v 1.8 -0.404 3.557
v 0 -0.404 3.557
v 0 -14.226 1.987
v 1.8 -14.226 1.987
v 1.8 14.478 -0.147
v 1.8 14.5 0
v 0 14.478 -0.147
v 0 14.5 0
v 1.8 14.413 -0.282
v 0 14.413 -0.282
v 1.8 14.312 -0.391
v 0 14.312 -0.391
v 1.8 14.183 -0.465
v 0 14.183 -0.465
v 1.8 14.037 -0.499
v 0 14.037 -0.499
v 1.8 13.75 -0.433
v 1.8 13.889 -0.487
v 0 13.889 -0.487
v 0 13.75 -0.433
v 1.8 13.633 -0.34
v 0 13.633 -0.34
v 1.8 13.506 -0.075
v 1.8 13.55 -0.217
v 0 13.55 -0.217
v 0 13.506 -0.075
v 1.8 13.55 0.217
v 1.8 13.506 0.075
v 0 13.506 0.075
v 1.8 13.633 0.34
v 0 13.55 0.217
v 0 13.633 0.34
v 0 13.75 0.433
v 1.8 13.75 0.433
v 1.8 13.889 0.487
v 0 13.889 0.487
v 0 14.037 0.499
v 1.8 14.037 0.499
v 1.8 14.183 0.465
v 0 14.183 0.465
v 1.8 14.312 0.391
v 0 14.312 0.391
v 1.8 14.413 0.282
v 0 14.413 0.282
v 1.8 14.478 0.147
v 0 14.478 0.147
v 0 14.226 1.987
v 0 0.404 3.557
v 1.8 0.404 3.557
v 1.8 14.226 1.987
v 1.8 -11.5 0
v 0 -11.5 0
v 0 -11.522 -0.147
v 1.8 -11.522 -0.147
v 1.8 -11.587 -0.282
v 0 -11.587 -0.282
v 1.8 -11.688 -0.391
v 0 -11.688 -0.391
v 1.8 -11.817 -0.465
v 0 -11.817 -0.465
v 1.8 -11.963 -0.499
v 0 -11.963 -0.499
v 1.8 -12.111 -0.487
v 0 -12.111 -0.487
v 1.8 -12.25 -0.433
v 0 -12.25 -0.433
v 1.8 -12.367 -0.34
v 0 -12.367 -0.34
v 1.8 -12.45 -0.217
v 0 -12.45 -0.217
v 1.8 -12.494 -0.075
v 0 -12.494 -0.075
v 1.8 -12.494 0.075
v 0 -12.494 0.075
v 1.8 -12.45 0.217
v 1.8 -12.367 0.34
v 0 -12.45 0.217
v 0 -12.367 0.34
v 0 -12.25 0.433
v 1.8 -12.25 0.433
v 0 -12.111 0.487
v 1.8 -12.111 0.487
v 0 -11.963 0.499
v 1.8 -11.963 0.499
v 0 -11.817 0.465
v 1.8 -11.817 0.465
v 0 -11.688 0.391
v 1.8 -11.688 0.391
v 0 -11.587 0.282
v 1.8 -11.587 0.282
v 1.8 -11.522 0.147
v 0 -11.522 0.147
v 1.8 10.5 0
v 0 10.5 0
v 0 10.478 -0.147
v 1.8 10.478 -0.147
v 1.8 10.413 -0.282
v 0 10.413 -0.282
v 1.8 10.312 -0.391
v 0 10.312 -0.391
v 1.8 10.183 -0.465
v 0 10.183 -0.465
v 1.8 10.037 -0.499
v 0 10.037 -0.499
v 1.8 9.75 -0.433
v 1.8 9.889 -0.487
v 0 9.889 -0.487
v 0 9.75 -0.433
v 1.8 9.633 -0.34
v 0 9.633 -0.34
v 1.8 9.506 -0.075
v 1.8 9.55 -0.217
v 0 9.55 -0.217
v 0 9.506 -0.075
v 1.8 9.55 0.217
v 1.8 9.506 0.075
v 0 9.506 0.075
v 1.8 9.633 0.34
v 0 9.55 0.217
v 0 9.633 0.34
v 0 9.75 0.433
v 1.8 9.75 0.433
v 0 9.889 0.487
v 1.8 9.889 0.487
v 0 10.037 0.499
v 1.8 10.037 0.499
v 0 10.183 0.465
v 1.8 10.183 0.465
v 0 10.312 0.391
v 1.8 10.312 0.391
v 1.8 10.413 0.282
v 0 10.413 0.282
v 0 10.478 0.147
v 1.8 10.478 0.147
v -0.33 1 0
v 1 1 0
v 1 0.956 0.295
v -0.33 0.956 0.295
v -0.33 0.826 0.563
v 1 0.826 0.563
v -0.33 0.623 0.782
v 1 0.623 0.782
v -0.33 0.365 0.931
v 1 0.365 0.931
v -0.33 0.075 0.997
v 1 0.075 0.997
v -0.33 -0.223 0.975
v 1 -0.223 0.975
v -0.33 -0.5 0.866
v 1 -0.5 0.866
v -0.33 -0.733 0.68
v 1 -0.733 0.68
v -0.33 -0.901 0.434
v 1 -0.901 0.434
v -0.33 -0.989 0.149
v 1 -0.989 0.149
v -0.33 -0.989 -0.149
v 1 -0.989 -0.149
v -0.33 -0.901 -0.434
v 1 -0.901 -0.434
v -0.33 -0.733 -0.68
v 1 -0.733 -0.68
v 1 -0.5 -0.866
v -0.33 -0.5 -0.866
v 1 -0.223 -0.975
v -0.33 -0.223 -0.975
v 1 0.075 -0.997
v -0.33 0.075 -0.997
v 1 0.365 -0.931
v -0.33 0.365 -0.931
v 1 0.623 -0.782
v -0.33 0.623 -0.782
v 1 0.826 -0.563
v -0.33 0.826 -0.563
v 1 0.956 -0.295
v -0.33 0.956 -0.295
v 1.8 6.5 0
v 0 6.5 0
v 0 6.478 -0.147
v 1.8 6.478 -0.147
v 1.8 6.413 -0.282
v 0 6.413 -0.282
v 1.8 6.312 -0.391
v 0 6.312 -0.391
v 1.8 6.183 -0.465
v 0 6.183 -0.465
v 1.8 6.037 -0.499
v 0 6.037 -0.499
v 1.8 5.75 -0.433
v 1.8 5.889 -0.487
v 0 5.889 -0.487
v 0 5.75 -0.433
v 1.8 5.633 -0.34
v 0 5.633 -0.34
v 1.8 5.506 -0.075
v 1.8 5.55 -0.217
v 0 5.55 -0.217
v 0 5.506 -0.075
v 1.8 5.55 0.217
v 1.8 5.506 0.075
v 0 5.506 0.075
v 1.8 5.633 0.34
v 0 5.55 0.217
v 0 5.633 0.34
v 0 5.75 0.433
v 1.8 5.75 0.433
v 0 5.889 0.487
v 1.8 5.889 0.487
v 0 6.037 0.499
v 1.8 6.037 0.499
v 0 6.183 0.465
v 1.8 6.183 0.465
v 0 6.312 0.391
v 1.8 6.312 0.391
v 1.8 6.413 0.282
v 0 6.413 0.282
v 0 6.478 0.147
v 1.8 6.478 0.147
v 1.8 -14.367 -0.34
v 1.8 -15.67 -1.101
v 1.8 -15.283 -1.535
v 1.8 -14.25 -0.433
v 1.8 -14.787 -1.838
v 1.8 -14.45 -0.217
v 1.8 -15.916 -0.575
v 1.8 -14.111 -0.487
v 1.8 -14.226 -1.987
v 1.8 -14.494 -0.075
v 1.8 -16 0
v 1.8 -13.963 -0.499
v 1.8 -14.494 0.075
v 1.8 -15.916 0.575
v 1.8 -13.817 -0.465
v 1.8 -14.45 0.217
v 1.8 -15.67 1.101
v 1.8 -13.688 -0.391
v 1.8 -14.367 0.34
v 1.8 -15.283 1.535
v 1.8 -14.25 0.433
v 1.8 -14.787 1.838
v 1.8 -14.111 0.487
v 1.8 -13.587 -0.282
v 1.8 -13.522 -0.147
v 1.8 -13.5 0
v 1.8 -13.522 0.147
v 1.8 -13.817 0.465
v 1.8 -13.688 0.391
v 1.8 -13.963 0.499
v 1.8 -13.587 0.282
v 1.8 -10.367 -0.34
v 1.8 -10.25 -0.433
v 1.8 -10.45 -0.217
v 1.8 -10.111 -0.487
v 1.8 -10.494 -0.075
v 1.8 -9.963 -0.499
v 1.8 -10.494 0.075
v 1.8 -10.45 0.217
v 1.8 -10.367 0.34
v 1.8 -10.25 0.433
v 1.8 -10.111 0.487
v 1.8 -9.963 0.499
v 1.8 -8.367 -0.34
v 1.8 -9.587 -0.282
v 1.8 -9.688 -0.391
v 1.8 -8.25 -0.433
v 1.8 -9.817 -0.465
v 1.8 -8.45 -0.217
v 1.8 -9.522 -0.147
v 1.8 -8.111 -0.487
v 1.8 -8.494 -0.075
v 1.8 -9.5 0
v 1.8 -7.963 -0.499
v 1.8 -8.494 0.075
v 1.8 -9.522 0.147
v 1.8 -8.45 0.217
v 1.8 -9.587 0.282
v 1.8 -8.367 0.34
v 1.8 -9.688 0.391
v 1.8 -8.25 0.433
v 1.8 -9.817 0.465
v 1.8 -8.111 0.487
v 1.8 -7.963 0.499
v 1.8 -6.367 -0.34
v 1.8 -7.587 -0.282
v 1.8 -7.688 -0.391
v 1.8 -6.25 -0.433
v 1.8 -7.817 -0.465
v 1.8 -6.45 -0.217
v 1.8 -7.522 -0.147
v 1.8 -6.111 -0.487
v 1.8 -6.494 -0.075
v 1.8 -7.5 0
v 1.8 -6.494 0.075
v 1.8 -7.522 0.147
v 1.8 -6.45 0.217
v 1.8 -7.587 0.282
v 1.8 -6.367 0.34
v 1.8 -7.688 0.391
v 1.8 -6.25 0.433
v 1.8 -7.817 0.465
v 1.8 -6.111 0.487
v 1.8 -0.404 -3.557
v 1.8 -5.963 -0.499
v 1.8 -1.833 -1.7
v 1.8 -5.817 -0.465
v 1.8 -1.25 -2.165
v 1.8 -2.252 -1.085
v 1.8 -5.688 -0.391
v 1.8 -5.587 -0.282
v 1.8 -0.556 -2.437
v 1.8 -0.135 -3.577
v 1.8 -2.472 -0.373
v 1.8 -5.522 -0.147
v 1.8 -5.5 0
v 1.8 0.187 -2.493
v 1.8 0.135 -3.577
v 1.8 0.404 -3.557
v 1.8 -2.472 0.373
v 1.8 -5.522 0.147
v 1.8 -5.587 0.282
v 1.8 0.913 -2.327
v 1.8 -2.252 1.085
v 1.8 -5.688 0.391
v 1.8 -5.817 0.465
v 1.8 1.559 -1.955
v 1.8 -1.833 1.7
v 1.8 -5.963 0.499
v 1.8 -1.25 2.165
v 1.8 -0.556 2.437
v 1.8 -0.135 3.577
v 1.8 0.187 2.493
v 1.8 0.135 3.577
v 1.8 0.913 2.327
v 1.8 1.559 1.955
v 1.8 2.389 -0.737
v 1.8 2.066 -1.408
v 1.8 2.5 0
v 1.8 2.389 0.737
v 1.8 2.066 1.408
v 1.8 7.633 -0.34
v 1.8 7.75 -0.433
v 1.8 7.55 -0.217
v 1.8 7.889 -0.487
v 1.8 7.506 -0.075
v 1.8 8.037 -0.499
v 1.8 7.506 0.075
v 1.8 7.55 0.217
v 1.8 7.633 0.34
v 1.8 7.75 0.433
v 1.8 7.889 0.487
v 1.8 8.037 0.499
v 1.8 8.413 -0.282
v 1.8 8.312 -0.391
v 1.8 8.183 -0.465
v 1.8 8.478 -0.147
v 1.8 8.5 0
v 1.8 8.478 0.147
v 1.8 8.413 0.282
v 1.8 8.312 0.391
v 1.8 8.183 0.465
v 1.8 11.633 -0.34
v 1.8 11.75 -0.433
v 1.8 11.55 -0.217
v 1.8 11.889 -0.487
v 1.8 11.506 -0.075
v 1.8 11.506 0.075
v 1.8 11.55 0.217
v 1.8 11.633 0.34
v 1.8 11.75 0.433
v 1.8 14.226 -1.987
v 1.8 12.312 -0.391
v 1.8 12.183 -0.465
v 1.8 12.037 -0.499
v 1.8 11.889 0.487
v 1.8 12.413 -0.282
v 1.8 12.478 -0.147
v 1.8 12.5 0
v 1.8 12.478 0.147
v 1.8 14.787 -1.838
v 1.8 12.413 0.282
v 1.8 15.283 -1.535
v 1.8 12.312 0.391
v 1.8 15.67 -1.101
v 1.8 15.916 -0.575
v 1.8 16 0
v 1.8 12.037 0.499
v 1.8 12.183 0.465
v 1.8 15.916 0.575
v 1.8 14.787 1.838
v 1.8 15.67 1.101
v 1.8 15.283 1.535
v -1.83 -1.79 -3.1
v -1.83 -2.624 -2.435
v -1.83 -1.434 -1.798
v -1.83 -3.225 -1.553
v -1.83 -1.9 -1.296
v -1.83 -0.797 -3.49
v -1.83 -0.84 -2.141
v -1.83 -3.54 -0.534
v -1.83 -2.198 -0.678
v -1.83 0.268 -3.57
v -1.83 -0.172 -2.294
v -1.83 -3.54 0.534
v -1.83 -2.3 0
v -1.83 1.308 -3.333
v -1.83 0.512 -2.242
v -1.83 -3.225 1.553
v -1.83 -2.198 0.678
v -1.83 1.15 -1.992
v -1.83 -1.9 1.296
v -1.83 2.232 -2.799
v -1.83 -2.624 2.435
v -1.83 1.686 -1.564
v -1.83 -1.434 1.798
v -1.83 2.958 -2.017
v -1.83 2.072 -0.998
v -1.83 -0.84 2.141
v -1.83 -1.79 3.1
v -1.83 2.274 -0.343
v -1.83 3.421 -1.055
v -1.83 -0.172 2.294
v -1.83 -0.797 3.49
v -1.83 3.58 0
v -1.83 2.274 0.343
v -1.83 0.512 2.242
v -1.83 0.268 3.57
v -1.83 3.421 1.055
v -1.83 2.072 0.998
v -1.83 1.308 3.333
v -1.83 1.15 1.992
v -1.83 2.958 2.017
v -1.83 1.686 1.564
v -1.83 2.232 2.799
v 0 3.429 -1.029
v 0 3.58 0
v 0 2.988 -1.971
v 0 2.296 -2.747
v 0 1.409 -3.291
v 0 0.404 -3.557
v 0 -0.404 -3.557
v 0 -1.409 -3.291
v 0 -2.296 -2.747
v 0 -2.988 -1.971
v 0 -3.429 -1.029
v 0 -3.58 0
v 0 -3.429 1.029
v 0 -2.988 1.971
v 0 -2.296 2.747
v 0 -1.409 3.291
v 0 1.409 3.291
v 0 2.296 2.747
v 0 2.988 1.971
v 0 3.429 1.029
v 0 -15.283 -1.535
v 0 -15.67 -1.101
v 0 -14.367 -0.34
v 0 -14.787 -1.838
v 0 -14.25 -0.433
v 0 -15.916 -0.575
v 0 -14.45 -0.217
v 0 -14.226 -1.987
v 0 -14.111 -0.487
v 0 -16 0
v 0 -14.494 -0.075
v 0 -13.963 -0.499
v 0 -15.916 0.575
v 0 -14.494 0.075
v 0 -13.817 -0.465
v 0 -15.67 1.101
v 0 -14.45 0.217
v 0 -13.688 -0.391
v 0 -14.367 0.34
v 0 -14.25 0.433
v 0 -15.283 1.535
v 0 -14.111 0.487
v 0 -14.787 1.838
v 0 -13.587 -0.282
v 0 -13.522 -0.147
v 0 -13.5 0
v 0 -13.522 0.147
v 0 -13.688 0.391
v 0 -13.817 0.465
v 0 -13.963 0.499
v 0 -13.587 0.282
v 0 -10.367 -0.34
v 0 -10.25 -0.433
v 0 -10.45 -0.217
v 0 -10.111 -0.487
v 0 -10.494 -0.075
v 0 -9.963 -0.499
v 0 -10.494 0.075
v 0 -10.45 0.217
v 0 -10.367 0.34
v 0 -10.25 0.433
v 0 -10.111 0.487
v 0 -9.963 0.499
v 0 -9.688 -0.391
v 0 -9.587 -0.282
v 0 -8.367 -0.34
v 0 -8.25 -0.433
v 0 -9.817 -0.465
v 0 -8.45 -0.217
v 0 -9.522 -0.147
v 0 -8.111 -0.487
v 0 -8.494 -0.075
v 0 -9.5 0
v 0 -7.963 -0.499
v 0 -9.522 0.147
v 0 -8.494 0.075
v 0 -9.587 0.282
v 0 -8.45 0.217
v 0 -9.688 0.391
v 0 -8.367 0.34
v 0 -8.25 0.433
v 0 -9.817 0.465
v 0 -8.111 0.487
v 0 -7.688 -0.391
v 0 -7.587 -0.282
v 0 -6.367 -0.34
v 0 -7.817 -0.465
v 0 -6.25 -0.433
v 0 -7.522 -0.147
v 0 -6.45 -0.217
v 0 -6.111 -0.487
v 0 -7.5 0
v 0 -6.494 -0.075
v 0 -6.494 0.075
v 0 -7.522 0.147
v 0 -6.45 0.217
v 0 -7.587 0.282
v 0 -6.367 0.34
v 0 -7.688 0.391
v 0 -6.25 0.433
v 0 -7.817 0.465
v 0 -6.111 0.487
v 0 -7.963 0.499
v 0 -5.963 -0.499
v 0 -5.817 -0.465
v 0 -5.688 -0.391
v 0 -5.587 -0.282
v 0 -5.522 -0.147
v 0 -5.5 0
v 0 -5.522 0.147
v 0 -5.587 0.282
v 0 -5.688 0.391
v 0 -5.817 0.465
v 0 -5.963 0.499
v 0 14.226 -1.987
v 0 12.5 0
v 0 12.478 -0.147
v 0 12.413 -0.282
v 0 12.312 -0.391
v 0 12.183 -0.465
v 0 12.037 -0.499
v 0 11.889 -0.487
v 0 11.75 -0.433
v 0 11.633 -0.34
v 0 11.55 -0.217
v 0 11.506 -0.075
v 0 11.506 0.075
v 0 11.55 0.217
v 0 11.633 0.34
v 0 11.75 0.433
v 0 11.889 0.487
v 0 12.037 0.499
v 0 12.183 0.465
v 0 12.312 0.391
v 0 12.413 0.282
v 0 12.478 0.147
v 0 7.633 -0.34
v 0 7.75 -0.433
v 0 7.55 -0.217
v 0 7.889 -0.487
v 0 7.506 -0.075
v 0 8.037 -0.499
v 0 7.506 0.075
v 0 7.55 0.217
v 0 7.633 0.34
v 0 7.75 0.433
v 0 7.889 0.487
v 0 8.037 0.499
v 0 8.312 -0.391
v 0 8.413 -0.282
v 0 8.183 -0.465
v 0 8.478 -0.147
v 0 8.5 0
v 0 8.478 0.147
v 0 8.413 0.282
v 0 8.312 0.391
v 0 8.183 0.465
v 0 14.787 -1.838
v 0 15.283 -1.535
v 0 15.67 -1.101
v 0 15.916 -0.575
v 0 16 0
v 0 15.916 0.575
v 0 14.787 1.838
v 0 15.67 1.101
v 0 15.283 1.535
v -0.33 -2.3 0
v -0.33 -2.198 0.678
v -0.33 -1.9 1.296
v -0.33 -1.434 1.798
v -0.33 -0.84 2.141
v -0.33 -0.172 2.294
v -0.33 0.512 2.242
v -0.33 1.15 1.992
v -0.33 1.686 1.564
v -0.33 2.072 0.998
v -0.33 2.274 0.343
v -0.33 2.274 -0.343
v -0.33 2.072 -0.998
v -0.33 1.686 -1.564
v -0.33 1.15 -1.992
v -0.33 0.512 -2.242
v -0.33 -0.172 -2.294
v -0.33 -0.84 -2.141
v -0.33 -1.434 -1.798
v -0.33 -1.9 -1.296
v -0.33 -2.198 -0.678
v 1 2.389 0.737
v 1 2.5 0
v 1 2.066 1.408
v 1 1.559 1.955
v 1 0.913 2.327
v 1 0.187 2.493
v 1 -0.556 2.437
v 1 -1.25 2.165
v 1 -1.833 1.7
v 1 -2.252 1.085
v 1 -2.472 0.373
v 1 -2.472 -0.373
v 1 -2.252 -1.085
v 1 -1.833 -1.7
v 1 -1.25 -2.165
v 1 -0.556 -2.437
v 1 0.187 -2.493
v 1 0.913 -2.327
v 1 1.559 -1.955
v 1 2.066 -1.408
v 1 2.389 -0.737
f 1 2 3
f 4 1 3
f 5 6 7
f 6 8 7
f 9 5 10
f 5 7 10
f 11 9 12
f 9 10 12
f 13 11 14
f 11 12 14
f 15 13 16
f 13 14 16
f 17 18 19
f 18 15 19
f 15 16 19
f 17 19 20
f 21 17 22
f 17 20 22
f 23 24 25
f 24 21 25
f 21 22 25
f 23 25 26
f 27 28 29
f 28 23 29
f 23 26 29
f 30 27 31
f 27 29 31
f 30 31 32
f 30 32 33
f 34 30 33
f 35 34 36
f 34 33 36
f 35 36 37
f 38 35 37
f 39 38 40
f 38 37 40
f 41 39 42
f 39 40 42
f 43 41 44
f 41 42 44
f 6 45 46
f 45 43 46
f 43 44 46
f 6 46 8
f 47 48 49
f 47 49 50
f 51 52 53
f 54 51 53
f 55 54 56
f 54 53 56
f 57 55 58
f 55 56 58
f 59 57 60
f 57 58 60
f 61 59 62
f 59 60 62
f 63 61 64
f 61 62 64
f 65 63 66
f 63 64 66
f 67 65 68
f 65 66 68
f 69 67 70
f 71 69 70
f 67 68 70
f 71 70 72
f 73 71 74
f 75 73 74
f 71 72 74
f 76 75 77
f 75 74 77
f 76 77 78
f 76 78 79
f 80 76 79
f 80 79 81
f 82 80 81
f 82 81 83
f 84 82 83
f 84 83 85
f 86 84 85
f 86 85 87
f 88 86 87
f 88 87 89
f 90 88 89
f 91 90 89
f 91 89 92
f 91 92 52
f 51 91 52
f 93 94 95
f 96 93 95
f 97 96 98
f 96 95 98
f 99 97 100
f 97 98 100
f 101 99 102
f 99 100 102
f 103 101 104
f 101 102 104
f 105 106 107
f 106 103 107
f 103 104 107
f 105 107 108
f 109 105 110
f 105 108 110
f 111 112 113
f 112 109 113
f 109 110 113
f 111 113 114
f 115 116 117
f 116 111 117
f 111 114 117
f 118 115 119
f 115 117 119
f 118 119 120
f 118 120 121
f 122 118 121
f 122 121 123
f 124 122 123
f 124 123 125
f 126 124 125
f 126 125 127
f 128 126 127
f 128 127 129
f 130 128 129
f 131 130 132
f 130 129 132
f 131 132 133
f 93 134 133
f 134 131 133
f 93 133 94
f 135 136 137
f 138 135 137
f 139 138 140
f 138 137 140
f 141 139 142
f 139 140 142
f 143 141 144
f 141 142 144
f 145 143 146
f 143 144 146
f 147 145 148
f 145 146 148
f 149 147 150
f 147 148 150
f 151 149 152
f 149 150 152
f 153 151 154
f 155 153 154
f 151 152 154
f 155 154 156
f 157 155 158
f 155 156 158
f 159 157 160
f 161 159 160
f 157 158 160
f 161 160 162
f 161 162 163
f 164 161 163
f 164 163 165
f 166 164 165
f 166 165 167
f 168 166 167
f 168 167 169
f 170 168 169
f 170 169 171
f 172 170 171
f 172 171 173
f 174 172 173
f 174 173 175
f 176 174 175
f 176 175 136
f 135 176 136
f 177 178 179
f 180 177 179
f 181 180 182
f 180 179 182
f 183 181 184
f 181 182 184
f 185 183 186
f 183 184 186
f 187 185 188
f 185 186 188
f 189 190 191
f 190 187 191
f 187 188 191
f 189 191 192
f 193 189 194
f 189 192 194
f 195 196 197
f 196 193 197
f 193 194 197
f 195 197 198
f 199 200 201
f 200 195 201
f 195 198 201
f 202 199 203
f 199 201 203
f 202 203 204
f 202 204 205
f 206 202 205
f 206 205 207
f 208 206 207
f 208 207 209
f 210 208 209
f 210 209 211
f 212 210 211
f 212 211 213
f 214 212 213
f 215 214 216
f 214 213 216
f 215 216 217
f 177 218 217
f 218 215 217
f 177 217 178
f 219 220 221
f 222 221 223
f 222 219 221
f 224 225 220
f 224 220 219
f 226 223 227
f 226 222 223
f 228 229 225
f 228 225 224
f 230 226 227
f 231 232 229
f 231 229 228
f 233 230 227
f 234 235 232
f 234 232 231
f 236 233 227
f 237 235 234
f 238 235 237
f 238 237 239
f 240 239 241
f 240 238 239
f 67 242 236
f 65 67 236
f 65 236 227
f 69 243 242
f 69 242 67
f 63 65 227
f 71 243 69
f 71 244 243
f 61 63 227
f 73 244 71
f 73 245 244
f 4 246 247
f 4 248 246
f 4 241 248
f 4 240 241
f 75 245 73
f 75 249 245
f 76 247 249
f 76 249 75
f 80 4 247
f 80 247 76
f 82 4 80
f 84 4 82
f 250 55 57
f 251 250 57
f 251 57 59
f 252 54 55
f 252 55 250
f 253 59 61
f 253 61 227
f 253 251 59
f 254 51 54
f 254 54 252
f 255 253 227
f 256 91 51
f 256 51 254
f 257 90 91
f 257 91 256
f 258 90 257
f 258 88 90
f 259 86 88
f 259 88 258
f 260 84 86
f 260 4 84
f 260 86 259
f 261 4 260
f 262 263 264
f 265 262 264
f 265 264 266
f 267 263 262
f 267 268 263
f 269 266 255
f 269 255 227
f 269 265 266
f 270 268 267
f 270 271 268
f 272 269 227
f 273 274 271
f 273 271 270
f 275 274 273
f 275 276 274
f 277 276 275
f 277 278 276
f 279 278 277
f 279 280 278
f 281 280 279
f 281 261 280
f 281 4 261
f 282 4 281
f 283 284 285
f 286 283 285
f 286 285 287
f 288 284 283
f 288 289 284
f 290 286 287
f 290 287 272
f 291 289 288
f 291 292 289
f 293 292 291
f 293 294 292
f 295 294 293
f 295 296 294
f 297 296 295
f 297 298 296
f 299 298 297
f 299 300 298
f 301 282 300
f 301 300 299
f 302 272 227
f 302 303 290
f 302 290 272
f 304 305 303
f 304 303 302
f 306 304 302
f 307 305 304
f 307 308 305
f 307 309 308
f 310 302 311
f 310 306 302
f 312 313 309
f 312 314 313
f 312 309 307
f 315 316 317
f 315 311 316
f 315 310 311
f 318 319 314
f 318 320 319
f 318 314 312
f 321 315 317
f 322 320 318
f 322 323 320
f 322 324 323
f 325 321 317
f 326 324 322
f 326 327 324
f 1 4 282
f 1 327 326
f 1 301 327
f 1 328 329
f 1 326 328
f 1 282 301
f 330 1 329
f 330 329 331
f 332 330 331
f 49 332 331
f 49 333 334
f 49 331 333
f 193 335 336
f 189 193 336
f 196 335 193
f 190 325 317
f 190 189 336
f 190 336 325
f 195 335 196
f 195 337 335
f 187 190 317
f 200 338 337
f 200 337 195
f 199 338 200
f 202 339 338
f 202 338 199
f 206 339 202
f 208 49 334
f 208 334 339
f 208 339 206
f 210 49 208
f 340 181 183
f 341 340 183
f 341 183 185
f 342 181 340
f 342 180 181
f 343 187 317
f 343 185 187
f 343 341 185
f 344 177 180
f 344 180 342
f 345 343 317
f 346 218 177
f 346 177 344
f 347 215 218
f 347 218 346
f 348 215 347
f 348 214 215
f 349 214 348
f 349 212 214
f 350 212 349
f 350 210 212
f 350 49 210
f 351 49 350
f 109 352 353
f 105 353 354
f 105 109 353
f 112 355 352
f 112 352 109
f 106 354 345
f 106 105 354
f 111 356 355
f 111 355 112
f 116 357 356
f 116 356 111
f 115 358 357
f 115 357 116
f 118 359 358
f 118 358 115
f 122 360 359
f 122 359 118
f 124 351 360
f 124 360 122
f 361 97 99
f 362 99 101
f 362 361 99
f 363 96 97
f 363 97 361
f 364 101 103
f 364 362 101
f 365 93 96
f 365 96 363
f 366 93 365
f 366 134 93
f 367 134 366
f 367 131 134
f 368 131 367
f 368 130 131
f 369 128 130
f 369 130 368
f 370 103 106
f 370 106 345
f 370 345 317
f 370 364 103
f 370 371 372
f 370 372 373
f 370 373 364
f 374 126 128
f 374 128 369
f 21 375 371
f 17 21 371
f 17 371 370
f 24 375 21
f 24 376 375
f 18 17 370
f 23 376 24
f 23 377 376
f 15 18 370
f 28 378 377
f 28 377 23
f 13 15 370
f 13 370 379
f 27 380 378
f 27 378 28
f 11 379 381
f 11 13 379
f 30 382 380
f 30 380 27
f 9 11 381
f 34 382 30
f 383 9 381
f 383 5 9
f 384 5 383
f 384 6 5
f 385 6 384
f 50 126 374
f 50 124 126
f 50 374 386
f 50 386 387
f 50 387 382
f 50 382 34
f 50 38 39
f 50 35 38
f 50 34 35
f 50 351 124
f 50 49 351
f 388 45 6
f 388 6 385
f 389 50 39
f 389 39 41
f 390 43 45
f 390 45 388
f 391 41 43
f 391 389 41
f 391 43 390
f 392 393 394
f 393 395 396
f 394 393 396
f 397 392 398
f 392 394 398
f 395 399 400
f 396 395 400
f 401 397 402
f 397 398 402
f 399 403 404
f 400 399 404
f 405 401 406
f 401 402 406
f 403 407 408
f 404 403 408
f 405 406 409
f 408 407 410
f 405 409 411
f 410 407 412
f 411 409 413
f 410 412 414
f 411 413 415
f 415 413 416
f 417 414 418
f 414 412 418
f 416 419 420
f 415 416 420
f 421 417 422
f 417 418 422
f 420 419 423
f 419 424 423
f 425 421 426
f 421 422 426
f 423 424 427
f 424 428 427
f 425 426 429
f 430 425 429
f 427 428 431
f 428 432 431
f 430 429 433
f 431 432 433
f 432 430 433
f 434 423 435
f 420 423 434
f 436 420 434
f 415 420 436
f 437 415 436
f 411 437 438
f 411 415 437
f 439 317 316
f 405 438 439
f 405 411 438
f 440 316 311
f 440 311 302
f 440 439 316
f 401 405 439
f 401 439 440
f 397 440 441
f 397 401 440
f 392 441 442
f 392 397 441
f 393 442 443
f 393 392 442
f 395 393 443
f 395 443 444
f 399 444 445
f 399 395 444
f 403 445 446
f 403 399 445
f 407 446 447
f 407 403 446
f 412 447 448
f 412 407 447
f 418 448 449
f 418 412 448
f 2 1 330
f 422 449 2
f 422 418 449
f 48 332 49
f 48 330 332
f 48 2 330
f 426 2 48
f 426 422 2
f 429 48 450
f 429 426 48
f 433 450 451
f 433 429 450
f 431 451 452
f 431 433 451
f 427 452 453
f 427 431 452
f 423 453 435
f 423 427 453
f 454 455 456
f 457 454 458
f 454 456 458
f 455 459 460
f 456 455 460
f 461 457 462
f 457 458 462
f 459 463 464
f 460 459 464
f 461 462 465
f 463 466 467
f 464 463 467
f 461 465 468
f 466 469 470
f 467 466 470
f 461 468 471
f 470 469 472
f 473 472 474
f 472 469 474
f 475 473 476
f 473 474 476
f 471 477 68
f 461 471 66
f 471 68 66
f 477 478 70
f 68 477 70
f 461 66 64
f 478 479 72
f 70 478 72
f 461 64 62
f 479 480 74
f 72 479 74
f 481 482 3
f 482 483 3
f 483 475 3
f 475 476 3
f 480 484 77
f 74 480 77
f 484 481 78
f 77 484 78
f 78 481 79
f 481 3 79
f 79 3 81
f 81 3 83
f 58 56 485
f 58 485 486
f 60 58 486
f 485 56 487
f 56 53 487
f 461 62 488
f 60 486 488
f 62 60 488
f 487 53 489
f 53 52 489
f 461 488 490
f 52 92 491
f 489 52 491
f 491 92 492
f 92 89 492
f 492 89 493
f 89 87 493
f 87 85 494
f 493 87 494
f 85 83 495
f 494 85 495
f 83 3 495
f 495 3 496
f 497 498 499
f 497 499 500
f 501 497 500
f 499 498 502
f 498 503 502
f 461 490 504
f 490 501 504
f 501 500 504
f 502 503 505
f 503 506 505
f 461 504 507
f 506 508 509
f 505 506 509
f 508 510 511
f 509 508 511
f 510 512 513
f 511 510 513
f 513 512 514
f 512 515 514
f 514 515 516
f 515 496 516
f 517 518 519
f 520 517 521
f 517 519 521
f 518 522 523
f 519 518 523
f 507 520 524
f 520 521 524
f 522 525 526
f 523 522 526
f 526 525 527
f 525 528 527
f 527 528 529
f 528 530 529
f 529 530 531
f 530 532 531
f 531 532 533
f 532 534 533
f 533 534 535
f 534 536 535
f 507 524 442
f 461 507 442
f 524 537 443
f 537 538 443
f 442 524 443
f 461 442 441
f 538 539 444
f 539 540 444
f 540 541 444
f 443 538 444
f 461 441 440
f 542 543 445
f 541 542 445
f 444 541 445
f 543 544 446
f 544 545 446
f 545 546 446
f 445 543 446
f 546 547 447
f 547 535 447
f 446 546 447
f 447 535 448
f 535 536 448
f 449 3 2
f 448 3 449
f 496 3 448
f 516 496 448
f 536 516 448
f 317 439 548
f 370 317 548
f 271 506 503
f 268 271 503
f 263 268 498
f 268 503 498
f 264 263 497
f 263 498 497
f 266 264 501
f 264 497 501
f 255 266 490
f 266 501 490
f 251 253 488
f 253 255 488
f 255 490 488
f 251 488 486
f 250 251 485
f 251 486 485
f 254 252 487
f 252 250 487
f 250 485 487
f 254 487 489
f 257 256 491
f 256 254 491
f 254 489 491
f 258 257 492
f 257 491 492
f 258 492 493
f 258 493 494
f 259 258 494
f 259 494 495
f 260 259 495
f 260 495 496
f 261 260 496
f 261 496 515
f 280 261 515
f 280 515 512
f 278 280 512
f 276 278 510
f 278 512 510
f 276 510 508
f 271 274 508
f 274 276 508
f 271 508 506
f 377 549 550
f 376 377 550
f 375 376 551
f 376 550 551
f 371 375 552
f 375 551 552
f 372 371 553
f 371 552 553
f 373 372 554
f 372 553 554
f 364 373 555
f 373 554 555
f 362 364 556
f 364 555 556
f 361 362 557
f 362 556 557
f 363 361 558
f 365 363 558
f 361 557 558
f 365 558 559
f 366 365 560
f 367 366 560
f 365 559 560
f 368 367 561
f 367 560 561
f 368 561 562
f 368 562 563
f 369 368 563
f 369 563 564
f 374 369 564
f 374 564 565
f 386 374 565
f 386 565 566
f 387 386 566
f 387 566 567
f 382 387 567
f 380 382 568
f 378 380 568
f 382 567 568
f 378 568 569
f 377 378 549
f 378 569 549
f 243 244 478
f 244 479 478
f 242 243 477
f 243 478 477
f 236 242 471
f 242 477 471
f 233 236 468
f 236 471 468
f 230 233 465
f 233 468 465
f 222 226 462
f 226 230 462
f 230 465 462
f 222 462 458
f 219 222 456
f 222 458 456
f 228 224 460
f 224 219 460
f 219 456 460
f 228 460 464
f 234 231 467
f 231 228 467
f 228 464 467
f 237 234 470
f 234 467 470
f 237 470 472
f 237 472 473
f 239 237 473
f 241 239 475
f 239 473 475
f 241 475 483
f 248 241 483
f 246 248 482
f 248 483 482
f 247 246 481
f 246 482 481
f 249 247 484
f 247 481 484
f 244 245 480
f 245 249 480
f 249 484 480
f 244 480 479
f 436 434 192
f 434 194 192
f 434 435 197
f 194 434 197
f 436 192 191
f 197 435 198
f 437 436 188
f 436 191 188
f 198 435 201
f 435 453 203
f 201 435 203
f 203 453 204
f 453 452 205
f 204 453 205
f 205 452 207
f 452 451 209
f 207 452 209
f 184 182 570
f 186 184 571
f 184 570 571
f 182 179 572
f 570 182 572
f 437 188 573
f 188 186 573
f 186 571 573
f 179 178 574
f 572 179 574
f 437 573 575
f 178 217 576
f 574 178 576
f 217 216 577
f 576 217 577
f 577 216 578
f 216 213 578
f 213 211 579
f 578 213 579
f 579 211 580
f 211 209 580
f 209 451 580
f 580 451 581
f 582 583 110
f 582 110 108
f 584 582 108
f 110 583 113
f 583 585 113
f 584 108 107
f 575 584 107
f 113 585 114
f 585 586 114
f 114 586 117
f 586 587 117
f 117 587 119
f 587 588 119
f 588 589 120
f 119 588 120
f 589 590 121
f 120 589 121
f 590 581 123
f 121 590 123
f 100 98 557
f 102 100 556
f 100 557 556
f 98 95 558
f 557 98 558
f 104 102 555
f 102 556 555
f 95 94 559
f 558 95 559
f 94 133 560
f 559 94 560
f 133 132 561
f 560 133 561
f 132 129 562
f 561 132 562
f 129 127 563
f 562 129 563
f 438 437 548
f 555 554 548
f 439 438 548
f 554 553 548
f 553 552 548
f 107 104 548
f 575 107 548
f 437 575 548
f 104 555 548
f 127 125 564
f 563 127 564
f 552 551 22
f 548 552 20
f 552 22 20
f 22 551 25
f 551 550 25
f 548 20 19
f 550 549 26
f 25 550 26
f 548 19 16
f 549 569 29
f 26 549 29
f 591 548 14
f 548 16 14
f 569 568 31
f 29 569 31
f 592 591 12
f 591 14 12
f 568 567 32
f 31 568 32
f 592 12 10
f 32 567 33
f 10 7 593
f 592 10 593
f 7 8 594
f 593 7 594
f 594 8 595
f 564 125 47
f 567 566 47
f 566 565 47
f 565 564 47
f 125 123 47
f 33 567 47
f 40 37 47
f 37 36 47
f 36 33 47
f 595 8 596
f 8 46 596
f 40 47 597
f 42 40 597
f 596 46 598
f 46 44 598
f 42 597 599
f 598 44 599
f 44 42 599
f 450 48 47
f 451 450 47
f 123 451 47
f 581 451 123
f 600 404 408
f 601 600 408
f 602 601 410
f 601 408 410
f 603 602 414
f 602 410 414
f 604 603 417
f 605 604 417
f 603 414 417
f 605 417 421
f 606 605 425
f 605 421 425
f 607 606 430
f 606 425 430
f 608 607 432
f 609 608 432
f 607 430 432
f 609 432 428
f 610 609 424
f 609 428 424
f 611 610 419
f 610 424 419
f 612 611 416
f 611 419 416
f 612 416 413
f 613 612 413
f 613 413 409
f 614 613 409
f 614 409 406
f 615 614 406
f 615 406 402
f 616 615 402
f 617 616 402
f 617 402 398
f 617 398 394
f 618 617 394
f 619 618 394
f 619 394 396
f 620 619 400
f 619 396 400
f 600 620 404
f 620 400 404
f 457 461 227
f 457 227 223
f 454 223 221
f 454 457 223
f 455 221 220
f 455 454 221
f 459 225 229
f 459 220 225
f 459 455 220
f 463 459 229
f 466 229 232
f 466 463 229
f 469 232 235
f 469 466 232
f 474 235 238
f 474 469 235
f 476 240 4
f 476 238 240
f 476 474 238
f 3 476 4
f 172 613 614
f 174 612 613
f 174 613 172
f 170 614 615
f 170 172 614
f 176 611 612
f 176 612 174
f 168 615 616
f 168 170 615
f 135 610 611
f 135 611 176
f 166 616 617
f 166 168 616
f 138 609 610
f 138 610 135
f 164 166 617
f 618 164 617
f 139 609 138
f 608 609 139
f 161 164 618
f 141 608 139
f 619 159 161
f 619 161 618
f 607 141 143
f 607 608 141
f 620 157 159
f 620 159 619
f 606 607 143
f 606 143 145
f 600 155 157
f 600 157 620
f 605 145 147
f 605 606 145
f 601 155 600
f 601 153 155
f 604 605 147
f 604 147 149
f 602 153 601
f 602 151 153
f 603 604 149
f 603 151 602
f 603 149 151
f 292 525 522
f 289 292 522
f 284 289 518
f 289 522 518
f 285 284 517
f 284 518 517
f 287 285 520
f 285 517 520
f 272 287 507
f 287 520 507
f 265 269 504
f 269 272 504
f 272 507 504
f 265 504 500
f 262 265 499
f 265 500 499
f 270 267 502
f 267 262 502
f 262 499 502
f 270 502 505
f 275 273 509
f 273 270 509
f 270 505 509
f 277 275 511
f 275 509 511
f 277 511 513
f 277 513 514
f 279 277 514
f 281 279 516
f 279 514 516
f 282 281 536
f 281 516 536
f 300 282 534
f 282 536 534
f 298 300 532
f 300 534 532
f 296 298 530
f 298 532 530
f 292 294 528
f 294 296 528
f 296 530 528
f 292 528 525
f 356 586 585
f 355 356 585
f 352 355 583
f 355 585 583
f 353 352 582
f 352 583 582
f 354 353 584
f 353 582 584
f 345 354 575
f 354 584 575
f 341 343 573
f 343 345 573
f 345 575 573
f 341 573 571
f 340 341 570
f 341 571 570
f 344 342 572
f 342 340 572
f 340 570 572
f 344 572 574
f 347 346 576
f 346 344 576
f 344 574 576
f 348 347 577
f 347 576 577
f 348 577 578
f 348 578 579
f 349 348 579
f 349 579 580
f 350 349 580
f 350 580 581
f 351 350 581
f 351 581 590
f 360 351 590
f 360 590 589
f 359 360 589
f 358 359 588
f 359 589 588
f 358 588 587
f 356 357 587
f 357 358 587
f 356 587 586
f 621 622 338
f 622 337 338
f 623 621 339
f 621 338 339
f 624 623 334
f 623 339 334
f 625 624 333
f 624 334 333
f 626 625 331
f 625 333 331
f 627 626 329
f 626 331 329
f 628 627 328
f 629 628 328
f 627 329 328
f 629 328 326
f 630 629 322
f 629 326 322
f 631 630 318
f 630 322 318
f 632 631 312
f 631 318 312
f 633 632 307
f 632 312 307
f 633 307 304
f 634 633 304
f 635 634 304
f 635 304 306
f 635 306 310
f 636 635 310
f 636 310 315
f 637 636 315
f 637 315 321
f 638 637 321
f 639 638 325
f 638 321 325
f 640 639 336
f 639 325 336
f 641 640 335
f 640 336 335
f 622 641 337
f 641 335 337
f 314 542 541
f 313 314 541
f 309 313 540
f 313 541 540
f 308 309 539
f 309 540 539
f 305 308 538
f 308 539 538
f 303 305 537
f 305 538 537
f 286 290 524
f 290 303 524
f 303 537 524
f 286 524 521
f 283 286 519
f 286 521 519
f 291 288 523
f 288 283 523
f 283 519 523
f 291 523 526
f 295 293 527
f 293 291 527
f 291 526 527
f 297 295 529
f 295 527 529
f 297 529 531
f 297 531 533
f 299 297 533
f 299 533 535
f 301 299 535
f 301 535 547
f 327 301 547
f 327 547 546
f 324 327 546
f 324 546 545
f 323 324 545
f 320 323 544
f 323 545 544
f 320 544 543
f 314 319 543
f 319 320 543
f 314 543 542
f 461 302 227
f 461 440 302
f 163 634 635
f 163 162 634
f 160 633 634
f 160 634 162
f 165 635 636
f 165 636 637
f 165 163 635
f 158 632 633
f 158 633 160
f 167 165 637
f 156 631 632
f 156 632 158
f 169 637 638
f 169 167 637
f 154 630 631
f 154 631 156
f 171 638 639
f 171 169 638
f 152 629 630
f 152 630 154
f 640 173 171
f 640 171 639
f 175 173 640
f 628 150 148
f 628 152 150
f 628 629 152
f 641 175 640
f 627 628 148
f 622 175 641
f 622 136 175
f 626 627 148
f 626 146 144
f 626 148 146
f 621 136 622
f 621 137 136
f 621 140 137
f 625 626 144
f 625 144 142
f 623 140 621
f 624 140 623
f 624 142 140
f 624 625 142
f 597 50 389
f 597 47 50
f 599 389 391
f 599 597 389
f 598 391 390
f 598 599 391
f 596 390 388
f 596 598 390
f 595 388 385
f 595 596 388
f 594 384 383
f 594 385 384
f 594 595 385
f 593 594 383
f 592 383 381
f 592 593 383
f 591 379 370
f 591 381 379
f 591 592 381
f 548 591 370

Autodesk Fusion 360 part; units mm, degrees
sketch "Sketch1" plane through (0, 0, 0) normal (1, 0, 0) x (0, 1, 0)
  circle A0 centre (0, 0) radius 3.58
  circle A1 centre (14, 0) radius 2
  line L0 (0.404, 3.5571) -> (14.2257, 1.9872)
  line L1 (0.404, -3.5571) -> (14.2257, -1.9872)
  circle A2 centre (14, 0) radius 0.5
  circle A3 centre (12, 0) radius 0.5
  circle A4 centre (10, 0) radius 0.5
  circle A5 centre (8, 0) radius 0.5
  circle A6 centre (6, 0) radius 0.5
  line L2 (0, 7) -> (0, -7.5)
  circle A7 centre (-6, 0) radius 0.5
  circle A8 centre (-8, 0) radius 0.5
  line L3 (-0.404, 3.5571) -> (-14.2257, 1.9872)
  circle A9 centre (-10, 0) radius 0.5
  circle A10 centre (-12, 0) radius 0.5
  circle A11 centre (-14, 0) radius 2
  circle A12 centre (-14, 0) radius 0.5
  line L4 (-0.404, -3.5571) -> (-14.2257, -1.9872)
  dimension "d4" = 7.16
  dimension "d5" = 4
  dimension "d6" = 14
  dimension "d7" = 1
  dimension "d10" = -8
  dimension "d11" = 0
extrude "Extrude1" add sketch "Sketch1" along normal blind 1.8 contours A0 L2 | A0 A1 L0 L1 A3 | A0 L2 | A1 A3 | A0 L3 A10 A11 L4 | A10 A11 picked at (12.8171, -0.6045) picked at (-12.8171, -0.6045) makes body 1
extrude "Extrude2" add sketch "Sketch1" along normal blind 1.8 separate body contours A0 L2 | A0 A1 L0 L1 A3 | A0 L2 | A1 A3 picked at (12.8171, -0.6045) makes body 2
sketch "Sketch2" plane through (0, 0, 0) normal (1, 0, 0) x (0, 1, 0)
extrude "Extrude3" add sketch "Sketch1" against normal blind 1.83 contours A0 L2 | A0 L2 bodies 1
sketch "Sketch3" plane through (1.8, 0, 0) normal (1, 0, 0) x (0, 1, 0)
  circle A0 centre (-8, 0) radius 0.5
  circle A1 centre (8, 0) radius 0.5
  circle A2 centre (-10, 0) radius 0.5
  circle A3 centre (10, 0) radius 0.5
  circle A4 centre (-6, 0) radius 0.5
  circle A5 centre (14, 0) radius 0.5
  circle A6 centre (-14, 0) radius 0.5
  circle A7 centre (12, 0) radius 0.5
  circle A8 centre (6, 0) radius 0.5
  circle A9 centre (-12, 0) radius 0.5
  line L0 (0.404, -3.5571) -> (14.2257, -1.9872)
  arc A10 (14.2257, -1.9872) -> (14.2257, 1.9872) centre (14, 0) ccw
  line L1 (14.2257, 1.9872) -> (0.404, 3.5571)
  arc A11 (0.404, 3.5571) -> (-0.404, 3.5571) centre (0, 0) ccw
  line L2 (-0.404, 3.5571) -> (-14.2257, 1.9872)
  arc A12 (-14.2257, 1.9872) -> (-14.2257, -1.9872) centre (-14, 0) ccw
  line L3 (-14.2257, -1.9872) -> (-0.404, -3.5571)
  arc A13 (-0.404, -3.5571) -> (0.404, -3.5571) centre (0, 0) ccw
  circle A14 centre (0, 0) radius 2.5
  circle A15 centre (0, 0) radius 3.58
  dimension "d18" = 5
extrude "Extrude4" cut sketch "Sketch3" against normal blind 0.8 contours A14 bodies 1
sketch "Sketch4" plane through (1, 0, 0) normal (1, 0, 0) x (0, 1, 0)
  circle A0 centre (0, 0) radius 2.5
  circle A1 centre (0, 0) radius 2.5
  circle A2 centre (0, 0) radius 1
  dimension "d21" = 2
extrude "Extrude5" cut sketch "Sketch4" against normal blind 13.5 contours A2 bodies 1
sketch "Sketch5" plane through (-1.83, 0, 0) normal (-1, 0, 0) x (0, -1, 0)
  circle A0 centre (0, 0) radius 1
  circle A1 centre (0, 0) radius 3.58
  circle A2 centre (0, 0) radius 2.3
  dimension "d24" = 4.6
extrude "Extrude6" cut sketch "Sketch5" against normal blind 1.5 contours A2 bodies 1
extrude "Extrude7" add sketch "Sketch1" against normal blind 1.83 contours A0 L2 | A0 L2 bodies 2
extrude "Extrude8" cut sketch "Sketch3" against normal blind 0.8 contours A14 bodies 2
extrude "Extrude9" cut sketch "Sketch5" against normal blind 1.5 contours A2 bodies 2
extrude "Extrude10" cut 1 faces at (-1.83, 0.6188, -0.2429) along direction (1, 0, 0) blind 27.5 on bodies 2 bodies 2
hidden bodies 2
equation "d4 = 3.58 * 2 mm"
equation "d16 = -3.43 mm + 1.6 mm"
equation "d27 = -3.43 mm + 1.6 mm"
